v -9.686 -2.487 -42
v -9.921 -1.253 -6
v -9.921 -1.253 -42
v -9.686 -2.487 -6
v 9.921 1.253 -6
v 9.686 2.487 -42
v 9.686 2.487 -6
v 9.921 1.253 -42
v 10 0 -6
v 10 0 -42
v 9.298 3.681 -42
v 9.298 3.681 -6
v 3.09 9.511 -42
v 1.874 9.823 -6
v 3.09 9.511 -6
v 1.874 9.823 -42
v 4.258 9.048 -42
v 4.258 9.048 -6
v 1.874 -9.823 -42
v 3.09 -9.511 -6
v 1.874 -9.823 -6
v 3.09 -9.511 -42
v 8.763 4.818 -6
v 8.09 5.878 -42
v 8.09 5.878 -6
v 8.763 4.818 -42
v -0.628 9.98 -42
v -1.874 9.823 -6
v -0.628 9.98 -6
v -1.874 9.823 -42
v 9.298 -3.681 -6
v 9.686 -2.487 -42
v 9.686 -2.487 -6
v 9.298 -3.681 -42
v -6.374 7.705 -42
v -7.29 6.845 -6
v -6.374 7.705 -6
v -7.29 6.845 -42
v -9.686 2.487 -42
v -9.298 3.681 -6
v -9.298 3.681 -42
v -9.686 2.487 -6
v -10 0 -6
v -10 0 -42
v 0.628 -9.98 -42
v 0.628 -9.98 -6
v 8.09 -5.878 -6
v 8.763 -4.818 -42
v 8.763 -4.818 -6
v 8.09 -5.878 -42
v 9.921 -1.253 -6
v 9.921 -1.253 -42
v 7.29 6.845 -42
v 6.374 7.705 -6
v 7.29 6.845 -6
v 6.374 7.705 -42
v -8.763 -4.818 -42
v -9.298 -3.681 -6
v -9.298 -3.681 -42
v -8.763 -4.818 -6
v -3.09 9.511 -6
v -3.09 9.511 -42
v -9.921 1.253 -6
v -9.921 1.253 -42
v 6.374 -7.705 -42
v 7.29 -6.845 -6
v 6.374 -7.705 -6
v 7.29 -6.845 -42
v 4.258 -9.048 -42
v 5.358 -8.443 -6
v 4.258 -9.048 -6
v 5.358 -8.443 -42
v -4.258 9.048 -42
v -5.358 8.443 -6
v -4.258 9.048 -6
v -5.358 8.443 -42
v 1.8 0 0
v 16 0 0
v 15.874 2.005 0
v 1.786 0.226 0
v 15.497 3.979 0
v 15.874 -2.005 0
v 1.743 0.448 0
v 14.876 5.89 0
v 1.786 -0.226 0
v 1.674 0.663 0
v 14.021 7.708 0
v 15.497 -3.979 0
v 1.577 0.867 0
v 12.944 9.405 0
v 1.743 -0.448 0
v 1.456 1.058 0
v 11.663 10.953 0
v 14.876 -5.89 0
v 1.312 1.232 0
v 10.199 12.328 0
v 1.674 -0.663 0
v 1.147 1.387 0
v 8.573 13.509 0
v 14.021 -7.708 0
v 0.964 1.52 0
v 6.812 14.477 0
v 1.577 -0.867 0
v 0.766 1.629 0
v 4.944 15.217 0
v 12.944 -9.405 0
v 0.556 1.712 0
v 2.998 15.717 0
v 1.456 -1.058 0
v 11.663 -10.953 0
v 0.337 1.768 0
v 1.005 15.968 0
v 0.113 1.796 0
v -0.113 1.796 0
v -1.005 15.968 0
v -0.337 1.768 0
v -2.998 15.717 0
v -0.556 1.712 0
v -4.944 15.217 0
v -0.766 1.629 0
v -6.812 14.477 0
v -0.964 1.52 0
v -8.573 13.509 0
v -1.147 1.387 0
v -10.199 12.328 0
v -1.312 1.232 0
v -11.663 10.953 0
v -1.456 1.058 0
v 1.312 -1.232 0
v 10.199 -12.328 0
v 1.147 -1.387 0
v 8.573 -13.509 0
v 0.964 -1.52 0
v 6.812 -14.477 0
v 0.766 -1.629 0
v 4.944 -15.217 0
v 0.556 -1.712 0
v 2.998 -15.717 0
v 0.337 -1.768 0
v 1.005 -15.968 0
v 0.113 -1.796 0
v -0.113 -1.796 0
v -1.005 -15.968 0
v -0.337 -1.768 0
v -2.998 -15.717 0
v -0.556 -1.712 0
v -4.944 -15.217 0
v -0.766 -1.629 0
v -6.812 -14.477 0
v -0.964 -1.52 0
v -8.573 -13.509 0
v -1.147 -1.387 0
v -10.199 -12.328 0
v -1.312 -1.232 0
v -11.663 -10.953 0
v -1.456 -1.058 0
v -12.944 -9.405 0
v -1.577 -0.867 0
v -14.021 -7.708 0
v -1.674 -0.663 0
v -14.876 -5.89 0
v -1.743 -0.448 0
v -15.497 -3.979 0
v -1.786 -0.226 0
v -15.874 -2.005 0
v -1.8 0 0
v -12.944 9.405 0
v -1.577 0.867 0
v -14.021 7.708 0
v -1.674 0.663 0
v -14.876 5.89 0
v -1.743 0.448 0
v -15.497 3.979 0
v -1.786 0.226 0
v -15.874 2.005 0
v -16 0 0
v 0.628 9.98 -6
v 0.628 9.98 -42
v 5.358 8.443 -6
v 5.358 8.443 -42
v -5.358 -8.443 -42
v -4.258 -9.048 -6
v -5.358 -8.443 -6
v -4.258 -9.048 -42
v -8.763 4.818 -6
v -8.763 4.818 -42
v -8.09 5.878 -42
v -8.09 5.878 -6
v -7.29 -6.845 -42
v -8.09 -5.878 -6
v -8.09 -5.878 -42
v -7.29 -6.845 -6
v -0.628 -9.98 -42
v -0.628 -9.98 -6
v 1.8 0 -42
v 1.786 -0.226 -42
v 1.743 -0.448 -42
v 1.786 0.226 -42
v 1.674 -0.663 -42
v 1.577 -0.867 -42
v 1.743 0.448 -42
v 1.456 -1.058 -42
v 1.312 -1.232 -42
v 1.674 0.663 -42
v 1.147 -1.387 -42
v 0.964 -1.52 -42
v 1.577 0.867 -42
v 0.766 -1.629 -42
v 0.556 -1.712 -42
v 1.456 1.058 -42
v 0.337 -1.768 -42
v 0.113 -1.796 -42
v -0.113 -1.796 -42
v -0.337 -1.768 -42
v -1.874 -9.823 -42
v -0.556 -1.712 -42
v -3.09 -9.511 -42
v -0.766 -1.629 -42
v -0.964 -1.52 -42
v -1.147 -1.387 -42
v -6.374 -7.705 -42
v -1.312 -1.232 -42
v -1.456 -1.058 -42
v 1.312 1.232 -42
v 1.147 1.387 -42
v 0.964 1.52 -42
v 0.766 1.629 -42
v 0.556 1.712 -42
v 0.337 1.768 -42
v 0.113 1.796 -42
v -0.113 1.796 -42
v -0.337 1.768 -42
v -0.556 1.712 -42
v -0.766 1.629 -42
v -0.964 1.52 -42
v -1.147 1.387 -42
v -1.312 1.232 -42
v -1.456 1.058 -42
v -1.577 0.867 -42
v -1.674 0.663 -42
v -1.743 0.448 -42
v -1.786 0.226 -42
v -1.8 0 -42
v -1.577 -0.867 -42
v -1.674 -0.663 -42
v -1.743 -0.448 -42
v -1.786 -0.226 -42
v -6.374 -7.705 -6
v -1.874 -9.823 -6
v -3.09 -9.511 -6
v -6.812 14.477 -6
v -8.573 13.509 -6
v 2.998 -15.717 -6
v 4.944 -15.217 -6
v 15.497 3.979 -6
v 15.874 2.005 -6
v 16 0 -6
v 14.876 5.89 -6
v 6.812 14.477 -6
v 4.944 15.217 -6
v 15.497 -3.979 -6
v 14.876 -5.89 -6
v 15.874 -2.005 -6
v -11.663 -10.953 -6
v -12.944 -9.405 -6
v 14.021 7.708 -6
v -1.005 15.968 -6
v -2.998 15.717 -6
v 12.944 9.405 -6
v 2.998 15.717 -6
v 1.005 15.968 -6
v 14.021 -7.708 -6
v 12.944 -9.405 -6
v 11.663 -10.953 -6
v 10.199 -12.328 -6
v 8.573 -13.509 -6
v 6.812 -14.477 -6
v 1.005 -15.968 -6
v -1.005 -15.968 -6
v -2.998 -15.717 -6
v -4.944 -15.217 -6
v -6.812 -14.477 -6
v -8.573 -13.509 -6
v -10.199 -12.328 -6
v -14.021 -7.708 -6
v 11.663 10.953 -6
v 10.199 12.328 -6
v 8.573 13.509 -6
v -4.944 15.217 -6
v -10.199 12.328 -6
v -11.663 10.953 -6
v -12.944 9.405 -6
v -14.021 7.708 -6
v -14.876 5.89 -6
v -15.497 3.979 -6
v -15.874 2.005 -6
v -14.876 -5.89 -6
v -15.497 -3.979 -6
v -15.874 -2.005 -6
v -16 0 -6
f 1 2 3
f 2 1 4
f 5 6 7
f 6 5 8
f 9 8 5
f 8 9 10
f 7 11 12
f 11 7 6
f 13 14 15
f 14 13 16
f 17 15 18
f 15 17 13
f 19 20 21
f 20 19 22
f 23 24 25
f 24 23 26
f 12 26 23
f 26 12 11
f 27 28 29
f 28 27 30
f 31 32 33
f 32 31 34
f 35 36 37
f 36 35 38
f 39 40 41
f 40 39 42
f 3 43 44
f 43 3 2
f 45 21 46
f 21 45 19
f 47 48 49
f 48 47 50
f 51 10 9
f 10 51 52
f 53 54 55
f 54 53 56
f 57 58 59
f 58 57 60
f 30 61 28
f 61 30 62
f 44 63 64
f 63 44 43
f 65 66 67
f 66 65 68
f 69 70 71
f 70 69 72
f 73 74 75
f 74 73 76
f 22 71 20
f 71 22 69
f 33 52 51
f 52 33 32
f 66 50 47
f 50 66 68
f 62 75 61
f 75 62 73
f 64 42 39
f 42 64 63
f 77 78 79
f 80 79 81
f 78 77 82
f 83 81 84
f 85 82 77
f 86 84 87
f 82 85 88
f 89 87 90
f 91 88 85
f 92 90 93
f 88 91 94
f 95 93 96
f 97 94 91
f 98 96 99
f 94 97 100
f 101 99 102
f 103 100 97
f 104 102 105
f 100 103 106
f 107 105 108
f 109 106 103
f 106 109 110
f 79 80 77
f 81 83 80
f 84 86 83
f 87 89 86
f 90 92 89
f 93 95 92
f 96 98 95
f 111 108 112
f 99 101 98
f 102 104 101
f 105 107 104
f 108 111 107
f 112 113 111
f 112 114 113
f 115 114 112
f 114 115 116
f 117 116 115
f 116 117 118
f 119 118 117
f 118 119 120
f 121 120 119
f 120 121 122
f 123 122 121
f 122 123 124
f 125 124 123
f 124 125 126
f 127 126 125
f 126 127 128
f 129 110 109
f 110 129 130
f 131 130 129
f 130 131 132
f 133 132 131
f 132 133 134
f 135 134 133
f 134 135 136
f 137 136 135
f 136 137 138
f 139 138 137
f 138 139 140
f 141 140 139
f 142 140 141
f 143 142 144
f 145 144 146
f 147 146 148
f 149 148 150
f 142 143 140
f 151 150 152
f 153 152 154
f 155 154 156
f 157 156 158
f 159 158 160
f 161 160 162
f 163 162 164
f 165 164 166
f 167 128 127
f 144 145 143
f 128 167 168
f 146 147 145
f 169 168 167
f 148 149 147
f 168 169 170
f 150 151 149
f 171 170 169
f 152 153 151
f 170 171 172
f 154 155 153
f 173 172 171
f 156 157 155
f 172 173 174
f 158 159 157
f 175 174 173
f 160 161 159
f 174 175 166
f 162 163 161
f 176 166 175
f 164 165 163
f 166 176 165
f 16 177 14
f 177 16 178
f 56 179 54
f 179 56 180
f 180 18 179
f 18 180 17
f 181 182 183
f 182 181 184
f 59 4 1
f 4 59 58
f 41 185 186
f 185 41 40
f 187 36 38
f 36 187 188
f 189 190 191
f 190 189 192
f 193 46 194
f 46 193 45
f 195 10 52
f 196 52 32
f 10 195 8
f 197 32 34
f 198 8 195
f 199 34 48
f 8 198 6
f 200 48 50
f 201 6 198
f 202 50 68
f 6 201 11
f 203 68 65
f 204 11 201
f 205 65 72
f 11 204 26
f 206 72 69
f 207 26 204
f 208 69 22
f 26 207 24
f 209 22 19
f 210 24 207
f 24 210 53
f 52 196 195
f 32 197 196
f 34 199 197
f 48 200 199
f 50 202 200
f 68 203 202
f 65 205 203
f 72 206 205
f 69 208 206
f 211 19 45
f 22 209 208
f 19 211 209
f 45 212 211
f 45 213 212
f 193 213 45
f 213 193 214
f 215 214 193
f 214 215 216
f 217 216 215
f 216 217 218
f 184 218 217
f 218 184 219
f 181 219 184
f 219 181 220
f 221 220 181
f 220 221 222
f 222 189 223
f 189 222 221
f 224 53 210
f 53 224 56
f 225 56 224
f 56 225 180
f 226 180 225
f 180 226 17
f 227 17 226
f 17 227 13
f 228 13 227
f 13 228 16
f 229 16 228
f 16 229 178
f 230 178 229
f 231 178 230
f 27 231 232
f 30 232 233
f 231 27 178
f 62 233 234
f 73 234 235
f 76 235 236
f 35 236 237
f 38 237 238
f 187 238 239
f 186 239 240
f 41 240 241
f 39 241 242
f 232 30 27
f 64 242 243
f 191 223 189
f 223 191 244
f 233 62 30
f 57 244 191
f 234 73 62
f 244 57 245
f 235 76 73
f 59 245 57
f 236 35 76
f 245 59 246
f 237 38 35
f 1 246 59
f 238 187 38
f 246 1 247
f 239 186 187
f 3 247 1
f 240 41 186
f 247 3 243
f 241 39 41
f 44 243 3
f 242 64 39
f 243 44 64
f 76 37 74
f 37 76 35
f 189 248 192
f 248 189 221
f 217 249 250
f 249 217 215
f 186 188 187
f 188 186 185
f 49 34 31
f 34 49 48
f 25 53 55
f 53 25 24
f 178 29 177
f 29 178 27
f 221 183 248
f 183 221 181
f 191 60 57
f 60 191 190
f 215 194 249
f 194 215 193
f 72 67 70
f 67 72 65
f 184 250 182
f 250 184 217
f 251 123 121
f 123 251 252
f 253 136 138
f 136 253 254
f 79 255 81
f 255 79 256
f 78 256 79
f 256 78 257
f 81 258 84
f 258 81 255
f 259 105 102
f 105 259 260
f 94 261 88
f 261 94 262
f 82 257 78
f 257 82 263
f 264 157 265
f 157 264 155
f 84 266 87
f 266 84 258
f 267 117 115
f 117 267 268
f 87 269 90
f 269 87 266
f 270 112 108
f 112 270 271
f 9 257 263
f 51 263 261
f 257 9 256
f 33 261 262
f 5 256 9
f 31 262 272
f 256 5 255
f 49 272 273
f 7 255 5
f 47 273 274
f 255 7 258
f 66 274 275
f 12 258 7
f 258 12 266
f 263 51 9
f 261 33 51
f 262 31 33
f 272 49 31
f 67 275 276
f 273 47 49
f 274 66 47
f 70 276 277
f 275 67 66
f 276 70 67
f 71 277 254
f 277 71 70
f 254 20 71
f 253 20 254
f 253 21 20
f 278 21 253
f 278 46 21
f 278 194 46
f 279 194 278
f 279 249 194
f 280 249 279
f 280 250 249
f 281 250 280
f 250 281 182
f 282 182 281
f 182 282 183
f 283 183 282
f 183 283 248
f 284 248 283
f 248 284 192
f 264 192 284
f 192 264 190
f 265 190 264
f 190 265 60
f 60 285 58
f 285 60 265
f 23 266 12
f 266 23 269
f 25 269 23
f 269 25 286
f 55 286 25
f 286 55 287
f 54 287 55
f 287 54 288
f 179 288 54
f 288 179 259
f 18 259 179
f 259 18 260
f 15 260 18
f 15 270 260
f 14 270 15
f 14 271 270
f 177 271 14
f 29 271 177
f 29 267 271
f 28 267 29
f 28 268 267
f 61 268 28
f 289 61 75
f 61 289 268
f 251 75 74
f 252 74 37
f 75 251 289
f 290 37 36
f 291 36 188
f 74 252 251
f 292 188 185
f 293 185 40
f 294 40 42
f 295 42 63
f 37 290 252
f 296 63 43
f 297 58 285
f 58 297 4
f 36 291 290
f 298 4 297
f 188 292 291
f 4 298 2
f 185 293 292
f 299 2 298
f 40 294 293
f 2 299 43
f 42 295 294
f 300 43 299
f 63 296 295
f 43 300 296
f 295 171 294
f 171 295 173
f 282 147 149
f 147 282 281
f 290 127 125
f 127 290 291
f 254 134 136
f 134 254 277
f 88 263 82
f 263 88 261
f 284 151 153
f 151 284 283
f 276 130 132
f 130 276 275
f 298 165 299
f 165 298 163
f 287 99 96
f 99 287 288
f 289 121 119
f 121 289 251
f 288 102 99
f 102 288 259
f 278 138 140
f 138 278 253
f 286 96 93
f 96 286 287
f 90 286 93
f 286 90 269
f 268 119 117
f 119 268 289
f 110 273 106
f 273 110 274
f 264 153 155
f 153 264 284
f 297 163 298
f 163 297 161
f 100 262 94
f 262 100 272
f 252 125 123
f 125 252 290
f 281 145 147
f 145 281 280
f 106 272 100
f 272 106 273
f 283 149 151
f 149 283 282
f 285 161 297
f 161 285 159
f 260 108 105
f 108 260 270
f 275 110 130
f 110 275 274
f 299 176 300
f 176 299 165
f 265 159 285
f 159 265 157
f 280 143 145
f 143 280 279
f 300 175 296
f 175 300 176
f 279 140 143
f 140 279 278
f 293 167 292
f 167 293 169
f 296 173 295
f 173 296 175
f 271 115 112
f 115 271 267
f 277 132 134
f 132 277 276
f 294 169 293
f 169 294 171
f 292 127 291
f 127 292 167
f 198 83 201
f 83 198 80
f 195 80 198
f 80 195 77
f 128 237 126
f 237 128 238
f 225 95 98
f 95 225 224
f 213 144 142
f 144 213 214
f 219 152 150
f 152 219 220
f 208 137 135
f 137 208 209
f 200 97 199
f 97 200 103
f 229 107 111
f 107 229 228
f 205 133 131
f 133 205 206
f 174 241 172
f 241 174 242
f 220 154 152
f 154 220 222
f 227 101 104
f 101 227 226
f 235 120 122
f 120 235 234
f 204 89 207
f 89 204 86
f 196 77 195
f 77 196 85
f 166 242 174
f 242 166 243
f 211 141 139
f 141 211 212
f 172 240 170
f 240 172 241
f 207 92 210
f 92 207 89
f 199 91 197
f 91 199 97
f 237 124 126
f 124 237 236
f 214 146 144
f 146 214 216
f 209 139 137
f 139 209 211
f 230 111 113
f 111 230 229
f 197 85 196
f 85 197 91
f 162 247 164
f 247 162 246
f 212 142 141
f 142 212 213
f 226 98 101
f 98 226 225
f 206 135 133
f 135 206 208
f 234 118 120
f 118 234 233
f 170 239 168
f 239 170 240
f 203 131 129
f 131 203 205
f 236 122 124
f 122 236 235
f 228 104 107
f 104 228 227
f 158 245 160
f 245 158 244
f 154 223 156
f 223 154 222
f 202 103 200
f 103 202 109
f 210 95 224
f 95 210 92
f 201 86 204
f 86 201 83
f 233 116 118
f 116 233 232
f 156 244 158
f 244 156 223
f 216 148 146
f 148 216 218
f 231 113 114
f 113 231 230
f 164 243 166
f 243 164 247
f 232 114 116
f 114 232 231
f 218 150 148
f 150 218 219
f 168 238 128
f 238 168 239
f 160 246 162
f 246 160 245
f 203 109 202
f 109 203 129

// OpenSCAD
$fn = 50;


difference() {
	union() {
		translate(v = [0, 0, -42.0000000000]) {
			cylinder(h = 42, r = 10.0000000000);
		}
		translate(v = [0, 0, -6.0000000000]) {
			cylinder(h = 6, r = 16.0000000000);
		}
	}
	union() {
		#translate(v = [0, 0, -42]) {
			cylinder(h = 42, r = 1.8000000000);
		}
	}
}
